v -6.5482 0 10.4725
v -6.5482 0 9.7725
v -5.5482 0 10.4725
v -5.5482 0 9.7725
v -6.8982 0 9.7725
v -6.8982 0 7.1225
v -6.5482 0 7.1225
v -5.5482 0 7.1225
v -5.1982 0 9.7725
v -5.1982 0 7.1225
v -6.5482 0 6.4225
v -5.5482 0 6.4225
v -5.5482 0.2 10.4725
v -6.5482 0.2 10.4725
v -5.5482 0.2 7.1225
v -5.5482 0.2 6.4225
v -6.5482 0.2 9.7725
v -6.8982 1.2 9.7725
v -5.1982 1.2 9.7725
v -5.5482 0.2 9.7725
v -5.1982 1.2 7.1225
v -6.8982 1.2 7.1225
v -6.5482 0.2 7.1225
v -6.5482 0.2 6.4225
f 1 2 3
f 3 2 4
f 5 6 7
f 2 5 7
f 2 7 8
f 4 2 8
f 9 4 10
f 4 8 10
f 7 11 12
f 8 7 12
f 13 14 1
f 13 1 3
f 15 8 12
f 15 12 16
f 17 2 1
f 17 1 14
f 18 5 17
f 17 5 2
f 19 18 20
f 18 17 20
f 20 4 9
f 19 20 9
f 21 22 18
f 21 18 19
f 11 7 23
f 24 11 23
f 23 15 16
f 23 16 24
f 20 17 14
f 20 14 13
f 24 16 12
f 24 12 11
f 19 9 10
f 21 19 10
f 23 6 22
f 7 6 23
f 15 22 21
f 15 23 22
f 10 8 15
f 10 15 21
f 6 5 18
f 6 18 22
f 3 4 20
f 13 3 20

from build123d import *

# Parameters (mm, degrees)
SCHIZZO1_W                   = 1.7
SCHIZZO1_H                   = 2.65
ESTRUSIONE_ESTRUSIONE1_DEPTH = 1.2
SCHIZZO2_W                   = 1
SCHIZZO2_H                   = 0.2
ESTRUSIONE_ESTRUSIONE2_DEPTH = 0.7
SCHIZZO4_W                   = 1
SCHIZZO4_H                   = 0.2
ESTRUSIONE_ESTRUSIONE4_DEPTH = 0.7


with BuildPart() as part:
    # Schizzo1 → Estrusione-Estrusione1 (new body)
    with BuildSketch(Plane(origin=(0, 0, 0), x_dir=(1, 0, 0), z_dir=(0, 1, 0))):
        with Locations((-6.048243597, -8.447511762)):
            Rectangle(SCHIZZO1_W, SCHIZZO1_H)
    extrude(amount=ESTRUSIONE_ESTRUSIONE1_DEPTH)

    # Schizzo2 → Estrusione-Estrusione2 (add)
    with BuildSketch(Plane.XY.offset(9.772511762)):
        with Locations((-6.048243597, 0.1)):
            Rectangle(SCHIZZO2_W, SCHIZZO2_H)
    extrude(amount=ESTRUSIONE_ESTRUSIONE2_DEPTH)

    # Schizzo4 → Estrusione-Estrusione4 (add)
    with BuildSketch(Plane(origin=(0, 0, 7.122511762), x_dir=(-1, 0, 0), z_dir=(0, 0, -1))):
        with Locations((6.048243597, 0.1)):
            Rectangle(SCHIZZO4_W, SCHIZZO4_H)
    extrude(amount=ESTRUSIONE_ESTRUSIONE4_DEPTH)


solid = part.part
